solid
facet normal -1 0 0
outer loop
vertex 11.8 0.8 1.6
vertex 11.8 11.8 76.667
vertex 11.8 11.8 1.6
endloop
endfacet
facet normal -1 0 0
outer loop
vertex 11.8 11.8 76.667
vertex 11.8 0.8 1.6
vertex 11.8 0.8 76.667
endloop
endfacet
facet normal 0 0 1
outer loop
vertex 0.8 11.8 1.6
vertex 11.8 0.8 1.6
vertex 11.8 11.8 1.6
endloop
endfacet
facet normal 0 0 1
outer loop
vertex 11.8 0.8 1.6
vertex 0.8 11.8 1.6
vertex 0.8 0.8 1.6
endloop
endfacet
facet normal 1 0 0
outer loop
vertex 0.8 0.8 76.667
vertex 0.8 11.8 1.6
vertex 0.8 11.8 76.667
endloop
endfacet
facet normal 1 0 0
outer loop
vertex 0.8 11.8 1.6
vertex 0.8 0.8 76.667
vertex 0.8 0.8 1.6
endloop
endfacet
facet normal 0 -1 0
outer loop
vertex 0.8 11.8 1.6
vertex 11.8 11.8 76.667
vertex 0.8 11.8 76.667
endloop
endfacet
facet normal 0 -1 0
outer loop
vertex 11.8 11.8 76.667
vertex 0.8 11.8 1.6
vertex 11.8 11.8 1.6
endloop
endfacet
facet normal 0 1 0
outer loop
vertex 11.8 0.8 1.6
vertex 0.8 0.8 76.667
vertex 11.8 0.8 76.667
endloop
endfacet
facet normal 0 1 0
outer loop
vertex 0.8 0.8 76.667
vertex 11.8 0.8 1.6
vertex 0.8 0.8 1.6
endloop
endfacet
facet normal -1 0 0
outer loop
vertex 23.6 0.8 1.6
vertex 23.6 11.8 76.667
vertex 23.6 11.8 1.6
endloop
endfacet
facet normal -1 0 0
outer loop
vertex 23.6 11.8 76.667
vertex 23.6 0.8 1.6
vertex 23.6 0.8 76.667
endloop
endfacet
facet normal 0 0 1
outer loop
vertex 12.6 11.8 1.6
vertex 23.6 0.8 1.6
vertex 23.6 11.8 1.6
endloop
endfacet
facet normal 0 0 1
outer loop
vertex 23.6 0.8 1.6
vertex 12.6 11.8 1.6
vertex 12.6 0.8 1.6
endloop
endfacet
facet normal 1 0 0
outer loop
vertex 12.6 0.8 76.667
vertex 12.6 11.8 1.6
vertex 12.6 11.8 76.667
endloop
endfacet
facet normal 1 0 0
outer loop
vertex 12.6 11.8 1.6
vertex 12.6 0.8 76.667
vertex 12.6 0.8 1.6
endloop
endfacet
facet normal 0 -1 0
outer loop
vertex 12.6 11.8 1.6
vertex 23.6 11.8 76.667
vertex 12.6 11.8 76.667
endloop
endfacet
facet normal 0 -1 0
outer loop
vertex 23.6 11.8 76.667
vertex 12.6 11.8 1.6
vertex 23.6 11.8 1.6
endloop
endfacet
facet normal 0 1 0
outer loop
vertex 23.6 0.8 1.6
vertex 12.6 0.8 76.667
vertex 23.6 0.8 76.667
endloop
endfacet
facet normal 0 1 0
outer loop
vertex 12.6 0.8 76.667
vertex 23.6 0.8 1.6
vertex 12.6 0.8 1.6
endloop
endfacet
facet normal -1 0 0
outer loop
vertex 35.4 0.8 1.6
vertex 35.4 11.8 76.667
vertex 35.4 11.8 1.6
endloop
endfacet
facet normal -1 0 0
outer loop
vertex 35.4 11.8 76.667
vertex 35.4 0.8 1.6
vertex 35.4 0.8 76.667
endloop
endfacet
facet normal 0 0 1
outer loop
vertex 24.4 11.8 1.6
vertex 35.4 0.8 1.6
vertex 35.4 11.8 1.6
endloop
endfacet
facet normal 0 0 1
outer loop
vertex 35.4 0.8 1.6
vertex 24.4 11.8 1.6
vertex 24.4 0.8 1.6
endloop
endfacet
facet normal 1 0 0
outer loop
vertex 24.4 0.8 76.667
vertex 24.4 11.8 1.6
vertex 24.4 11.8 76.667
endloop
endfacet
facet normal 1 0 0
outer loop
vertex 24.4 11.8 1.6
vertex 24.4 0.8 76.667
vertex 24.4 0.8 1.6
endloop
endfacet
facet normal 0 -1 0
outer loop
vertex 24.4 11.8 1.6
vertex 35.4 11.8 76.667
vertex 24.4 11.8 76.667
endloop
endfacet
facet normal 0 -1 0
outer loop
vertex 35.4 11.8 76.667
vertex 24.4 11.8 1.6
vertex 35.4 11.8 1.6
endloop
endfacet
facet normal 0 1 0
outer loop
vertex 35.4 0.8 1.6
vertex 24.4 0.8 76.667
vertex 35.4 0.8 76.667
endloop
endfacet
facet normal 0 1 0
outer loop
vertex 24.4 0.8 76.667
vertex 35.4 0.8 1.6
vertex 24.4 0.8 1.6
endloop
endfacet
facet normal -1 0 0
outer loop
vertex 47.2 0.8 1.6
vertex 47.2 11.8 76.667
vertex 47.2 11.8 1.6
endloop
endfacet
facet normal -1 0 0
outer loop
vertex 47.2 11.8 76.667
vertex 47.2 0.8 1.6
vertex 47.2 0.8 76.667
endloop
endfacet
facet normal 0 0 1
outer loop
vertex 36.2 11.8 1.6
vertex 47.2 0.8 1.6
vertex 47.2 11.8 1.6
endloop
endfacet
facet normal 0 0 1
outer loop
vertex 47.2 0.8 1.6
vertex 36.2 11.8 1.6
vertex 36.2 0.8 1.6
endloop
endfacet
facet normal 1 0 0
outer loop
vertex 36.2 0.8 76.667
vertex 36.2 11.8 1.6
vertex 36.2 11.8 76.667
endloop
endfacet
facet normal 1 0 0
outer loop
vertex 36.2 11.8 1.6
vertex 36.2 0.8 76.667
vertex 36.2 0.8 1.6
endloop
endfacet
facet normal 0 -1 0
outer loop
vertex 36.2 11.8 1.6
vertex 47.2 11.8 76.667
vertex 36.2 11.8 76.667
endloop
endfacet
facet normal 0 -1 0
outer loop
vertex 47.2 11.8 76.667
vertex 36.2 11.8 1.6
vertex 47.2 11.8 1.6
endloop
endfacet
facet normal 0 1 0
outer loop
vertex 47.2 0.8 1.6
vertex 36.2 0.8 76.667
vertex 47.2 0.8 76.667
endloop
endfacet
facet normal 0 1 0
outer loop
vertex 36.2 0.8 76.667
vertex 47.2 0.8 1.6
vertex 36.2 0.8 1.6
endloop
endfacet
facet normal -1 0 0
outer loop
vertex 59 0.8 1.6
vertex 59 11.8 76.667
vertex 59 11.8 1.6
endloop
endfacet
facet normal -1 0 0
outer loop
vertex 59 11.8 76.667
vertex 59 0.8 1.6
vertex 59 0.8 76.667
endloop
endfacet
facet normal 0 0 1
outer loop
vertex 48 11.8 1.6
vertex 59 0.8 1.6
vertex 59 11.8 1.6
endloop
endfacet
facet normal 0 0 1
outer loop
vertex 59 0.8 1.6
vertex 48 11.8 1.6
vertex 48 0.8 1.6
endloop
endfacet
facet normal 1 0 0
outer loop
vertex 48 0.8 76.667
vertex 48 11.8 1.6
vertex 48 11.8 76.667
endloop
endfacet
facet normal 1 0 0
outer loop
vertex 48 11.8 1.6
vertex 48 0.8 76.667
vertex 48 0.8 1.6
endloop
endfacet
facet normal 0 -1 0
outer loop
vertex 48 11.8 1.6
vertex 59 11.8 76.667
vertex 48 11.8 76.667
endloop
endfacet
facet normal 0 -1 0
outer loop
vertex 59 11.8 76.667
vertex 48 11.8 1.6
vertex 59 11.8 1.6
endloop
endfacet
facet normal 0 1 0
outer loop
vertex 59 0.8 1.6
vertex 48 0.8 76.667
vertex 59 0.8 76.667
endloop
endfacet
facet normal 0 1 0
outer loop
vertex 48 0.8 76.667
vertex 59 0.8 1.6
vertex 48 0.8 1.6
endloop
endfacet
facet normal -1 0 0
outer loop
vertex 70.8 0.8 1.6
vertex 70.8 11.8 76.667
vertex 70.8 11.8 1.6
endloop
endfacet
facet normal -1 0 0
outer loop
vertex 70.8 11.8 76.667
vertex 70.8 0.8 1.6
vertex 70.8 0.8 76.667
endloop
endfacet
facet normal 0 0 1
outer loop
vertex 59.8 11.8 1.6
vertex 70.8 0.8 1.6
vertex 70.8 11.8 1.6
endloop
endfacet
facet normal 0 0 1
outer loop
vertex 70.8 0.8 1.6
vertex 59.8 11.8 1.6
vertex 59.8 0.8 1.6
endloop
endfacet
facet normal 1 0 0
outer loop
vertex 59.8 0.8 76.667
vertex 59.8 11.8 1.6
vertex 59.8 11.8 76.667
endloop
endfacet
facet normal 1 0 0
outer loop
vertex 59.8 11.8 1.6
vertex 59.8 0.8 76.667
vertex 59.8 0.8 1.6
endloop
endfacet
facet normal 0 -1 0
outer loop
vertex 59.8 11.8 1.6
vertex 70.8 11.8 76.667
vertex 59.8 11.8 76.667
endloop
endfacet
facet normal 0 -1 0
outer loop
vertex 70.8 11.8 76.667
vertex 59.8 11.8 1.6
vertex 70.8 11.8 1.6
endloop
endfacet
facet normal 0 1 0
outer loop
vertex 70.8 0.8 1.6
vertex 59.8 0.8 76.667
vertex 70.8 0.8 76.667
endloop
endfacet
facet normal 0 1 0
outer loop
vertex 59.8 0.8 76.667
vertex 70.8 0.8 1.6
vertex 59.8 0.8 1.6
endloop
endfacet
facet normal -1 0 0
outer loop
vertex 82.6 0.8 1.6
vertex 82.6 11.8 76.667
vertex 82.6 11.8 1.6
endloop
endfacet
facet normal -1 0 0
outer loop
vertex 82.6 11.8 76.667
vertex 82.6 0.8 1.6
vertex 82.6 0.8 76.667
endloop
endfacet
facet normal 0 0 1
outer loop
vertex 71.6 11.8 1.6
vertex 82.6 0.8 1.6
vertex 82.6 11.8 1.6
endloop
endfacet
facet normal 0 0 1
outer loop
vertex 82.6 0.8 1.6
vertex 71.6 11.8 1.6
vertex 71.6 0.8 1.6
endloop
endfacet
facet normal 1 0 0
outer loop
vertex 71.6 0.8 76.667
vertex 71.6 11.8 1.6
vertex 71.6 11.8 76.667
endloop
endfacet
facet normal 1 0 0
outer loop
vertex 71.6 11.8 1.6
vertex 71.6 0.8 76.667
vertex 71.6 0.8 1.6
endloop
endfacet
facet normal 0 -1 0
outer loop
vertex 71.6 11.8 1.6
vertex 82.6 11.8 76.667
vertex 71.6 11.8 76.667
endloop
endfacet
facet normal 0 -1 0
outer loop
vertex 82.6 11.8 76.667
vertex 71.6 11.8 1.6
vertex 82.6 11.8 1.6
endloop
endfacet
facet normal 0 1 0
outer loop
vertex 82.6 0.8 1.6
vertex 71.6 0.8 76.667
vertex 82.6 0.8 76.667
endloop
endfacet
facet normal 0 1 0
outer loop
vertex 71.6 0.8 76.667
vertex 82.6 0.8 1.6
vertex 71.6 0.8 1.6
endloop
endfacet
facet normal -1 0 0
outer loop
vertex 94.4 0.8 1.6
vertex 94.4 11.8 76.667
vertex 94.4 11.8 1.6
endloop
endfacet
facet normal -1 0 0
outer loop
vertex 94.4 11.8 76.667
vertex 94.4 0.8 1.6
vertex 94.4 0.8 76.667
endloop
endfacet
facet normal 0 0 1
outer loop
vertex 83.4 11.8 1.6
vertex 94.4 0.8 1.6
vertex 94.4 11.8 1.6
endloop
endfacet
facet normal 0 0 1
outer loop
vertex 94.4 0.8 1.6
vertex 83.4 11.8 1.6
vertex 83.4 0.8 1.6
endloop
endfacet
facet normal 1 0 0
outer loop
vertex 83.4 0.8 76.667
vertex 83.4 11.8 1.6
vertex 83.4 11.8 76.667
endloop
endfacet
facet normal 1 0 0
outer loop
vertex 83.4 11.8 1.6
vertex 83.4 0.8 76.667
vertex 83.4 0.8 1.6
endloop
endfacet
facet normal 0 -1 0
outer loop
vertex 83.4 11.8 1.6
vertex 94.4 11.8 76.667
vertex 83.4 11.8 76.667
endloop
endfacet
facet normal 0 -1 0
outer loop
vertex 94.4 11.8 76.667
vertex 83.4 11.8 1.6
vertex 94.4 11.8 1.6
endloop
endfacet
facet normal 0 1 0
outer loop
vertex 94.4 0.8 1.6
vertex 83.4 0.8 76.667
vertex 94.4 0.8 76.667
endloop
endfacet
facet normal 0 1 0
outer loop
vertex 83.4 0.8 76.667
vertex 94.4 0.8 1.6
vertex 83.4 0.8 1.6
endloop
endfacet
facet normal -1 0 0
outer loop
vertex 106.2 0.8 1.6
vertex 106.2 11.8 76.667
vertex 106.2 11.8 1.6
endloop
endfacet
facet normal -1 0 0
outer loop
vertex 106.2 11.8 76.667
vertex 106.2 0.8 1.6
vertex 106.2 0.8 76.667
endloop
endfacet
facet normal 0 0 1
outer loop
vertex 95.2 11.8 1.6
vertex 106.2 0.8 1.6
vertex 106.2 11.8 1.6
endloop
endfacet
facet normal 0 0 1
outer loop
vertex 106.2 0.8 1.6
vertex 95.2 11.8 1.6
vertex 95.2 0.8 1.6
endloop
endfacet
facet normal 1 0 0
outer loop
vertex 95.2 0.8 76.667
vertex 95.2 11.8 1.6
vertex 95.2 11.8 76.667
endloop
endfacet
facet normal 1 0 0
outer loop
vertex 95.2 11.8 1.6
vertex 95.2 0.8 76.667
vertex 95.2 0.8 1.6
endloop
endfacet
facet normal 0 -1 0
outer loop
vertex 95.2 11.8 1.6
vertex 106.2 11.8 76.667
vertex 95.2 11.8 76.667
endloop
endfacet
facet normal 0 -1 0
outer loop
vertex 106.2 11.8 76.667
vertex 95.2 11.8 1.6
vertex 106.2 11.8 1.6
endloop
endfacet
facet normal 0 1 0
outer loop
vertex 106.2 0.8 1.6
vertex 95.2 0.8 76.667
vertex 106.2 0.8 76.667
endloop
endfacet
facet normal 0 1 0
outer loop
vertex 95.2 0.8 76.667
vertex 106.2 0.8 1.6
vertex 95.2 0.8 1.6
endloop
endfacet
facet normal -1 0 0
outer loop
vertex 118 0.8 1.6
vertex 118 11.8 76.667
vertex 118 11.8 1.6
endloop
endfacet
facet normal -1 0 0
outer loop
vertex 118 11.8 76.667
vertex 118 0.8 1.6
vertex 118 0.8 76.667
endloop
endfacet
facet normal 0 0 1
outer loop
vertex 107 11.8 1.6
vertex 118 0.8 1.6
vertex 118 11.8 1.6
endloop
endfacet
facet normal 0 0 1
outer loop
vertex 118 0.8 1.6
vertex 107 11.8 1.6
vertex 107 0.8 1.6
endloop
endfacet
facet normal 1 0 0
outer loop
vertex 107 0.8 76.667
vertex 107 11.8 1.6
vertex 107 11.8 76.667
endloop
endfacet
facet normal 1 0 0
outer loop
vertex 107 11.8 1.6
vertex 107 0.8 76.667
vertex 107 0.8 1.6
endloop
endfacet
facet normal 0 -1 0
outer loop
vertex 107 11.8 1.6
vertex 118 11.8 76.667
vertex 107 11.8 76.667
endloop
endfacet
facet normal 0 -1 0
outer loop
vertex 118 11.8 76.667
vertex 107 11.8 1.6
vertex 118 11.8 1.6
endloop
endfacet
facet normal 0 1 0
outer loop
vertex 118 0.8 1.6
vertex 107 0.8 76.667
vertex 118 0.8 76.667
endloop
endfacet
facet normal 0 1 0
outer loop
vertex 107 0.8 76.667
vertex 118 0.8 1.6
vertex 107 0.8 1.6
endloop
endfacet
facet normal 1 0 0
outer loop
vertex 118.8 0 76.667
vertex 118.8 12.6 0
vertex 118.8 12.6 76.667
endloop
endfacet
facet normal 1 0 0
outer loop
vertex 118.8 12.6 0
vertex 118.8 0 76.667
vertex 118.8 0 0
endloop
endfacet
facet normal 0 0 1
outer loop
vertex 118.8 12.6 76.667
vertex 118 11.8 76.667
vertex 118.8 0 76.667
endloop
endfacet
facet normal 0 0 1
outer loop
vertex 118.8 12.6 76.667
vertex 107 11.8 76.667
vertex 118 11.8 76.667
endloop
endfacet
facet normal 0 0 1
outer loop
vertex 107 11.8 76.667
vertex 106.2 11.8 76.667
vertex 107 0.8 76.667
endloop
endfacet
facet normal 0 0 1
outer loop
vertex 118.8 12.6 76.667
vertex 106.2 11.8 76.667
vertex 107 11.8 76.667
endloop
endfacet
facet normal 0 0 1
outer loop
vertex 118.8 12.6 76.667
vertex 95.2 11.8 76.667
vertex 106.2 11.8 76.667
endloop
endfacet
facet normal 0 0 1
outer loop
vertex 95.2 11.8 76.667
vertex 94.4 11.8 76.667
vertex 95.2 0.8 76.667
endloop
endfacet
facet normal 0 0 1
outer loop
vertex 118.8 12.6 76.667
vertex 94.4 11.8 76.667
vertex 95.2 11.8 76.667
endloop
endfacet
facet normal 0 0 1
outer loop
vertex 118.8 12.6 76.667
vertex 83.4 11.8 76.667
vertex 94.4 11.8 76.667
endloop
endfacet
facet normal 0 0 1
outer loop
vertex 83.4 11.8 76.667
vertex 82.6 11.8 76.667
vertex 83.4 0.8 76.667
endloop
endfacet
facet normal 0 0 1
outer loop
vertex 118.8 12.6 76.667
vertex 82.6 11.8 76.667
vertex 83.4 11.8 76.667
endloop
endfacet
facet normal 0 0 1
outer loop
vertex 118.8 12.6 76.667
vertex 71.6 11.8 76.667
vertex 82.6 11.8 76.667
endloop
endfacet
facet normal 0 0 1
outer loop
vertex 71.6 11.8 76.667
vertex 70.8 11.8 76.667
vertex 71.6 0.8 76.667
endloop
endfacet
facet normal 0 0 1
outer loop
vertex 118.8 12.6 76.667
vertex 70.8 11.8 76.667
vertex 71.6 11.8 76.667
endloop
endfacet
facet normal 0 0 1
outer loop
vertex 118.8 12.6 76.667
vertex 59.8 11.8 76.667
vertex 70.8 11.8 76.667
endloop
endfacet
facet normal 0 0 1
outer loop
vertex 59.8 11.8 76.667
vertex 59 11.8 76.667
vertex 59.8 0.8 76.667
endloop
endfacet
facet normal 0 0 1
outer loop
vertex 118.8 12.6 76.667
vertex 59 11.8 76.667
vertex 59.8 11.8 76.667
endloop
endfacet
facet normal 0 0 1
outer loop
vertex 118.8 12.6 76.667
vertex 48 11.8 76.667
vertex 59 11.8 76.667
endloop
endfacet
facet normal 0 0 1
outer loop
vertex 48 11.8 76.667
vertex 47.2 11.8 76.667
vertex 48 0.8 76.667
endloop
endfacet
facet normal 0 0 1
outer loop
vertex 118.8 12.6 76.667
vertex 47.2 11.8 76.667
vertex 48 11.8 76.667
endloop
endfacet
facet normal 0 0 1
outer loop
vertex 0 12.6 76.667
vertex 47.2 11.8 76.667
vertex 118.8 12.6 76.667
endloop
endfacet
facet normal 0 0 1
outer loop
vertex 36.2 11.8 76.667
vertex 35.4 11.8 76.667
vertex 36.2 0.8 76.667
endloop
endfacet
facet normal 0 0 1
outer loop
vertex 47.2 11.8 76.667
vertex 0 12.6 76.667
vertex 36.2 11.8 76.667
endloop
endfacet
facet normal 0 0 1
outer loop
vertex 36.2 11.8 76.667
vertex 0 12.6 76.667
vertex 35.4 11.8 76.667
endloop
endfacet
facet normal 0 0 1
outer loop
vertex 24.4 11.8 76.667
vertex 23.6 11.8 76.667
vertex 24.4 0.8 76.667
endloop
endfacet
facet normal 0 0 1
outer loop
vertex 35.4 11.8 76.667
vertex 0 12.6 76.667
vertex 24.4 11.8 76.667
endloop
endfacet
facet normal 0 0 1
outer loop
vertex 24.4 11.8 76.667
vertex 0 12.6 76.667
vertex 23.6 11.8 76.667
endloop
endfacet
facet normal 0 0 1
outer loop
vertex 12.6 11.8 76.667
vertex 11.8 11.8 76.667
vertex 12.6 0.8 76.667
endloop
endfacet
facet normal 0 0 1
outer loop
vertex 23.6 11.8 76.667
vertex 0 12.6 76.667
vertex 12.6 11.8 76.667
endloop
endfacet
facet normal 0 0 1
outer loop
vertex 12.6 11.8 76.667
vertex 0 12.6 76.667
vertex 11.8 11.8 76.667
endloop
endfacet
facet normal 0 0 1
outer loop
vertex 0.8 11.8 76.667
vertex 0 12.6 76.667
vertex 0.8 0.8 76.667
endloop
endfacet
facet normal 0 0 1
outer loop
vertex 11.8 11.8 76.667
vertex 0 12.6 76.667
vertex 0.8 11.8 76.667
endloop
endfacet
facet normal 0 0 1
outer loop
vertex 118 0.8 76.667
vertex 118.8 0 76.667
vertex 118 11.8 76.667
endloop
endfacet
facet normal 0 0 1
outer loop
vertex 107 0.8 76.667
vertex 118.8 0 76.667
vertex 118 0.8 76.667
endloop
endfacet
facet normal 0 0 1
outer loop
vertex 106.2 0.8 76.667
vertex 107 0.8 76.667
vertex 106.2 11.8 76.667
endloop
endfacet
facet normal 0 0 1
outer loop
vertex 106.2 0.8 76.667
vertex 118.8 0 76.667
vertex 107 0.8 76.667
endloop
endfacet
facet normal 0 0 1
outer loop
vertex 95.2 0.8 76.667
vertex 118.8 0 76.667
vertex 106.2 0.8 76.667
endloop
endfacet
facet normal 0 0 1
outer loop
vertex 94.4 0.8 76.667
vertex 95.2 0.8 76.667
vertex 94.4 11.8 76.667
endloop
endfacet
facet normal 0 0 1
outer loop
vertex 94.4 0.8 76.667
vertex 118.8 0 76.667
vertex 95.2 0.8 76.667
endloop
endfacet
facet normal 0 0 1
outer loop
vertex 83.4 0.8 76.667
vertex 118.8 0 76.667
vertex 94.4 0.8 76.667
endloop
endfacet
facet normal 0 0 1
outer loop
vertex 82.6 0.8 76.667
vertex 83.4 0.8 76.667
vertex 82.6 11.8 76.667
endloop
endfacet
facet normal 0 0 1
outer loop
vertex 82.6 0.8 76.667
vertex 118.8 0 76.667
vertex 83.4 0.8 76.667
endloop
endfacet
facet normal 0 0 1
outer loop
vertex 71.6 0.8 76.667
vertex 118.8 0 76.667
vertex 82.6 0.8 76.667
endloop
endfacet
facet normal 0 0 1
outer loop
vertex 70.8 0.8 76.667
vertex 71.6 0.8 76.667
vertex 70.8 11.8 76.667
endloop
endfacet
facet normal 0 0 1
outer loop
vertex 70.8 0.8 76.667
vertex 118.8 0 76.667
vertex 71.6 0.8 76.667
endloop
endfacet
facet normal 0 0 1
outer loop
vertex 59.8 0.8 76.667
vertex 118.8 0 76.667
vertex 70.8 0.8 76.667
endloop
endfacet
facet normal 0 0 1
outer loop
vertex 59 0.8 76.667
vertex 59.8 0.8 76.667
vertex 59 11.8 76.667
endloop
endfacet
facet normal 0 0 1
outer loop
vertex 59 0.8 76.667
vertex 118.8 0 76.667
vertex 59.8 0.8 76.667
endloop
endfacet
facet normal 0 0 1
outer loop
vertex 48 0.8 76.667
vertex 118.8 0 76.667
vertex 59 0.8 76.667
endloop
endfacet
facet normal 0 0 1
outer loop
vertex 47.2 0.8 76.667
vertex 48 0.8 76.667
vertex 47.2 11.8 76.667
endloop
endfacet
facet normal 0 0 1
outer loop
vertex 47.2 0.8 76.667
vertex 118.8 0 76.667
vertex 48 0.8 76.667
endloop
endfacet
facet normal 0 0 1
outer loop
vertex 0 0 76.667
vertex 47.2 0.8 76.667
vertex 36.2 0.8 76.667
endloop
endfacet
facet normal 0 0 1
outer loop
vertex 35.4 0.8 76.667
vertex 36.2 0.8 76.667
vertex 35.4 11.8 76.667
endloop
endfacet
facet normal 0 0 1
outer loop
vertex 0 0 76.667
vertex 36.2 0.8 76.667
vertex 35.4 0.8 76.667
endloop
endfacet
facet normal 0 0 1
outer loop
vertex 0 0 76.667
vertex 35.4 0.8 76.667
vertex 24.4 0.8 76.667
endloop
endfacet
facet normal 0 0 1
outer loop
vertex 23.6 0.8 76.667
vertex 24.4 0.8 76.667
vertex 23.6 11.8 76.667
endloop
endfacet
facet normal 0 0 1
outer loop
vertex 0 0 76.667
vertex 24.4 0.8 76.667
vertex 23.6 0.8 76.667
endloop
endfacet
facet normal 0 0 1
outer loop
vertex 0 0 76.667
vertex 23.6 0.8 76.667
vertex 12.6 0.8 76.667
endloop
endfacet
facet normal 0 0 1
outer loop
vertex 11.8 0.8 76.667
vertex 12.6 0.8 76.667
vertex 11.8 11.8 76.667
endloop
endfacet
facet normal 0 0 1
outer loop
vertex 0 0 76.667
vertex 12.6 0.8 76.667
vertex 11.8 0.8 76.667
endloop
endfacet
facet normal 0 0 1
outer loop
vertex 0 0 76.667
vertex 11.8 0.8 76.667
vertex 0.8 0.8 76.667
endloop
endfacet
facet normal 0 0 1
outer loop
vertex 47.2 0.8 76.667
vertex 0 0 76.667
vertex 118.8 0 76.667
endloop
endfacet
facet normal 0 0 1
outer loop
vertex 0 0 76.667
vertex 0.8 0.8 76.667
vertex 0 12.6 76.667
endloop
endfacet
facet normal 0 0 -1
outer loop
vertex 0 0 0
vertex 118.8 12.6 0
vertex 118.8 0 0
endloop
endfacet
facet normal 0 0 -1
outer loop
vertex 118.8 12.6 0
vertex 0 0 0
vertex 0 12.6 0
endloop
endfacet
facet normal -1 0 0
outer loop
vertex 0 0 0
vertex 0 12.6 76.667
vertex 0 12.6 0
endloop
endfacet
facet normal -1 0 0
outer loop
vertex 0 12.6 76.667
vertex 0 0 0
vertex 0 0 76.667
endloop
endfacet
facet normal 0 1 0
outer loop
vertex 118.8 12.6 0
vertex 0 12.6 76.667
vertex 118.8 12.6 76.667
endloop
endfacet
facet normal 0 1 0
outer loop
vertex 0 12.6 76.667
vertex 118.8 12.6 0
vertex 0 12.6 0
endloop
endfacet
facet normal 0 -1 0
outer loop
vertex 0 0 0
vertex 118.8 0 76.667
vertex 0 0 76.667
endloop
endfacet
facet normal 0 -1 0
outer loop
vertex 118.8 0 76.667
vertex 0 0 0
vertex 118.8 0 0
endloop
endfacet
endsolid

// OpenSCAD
wood_w = 10+1;
wood_p = wood_w;

wall = .8;

difference() {
	cube([wood_w*10+wall*11, wood_p+wall*2,115*2/3]);
	for (x = [0:9]) {
		translate([wall+wood_w*x+wall*x, wall, wall*2])
			cube([wood_w, wood_p, 100]);
	}
}
